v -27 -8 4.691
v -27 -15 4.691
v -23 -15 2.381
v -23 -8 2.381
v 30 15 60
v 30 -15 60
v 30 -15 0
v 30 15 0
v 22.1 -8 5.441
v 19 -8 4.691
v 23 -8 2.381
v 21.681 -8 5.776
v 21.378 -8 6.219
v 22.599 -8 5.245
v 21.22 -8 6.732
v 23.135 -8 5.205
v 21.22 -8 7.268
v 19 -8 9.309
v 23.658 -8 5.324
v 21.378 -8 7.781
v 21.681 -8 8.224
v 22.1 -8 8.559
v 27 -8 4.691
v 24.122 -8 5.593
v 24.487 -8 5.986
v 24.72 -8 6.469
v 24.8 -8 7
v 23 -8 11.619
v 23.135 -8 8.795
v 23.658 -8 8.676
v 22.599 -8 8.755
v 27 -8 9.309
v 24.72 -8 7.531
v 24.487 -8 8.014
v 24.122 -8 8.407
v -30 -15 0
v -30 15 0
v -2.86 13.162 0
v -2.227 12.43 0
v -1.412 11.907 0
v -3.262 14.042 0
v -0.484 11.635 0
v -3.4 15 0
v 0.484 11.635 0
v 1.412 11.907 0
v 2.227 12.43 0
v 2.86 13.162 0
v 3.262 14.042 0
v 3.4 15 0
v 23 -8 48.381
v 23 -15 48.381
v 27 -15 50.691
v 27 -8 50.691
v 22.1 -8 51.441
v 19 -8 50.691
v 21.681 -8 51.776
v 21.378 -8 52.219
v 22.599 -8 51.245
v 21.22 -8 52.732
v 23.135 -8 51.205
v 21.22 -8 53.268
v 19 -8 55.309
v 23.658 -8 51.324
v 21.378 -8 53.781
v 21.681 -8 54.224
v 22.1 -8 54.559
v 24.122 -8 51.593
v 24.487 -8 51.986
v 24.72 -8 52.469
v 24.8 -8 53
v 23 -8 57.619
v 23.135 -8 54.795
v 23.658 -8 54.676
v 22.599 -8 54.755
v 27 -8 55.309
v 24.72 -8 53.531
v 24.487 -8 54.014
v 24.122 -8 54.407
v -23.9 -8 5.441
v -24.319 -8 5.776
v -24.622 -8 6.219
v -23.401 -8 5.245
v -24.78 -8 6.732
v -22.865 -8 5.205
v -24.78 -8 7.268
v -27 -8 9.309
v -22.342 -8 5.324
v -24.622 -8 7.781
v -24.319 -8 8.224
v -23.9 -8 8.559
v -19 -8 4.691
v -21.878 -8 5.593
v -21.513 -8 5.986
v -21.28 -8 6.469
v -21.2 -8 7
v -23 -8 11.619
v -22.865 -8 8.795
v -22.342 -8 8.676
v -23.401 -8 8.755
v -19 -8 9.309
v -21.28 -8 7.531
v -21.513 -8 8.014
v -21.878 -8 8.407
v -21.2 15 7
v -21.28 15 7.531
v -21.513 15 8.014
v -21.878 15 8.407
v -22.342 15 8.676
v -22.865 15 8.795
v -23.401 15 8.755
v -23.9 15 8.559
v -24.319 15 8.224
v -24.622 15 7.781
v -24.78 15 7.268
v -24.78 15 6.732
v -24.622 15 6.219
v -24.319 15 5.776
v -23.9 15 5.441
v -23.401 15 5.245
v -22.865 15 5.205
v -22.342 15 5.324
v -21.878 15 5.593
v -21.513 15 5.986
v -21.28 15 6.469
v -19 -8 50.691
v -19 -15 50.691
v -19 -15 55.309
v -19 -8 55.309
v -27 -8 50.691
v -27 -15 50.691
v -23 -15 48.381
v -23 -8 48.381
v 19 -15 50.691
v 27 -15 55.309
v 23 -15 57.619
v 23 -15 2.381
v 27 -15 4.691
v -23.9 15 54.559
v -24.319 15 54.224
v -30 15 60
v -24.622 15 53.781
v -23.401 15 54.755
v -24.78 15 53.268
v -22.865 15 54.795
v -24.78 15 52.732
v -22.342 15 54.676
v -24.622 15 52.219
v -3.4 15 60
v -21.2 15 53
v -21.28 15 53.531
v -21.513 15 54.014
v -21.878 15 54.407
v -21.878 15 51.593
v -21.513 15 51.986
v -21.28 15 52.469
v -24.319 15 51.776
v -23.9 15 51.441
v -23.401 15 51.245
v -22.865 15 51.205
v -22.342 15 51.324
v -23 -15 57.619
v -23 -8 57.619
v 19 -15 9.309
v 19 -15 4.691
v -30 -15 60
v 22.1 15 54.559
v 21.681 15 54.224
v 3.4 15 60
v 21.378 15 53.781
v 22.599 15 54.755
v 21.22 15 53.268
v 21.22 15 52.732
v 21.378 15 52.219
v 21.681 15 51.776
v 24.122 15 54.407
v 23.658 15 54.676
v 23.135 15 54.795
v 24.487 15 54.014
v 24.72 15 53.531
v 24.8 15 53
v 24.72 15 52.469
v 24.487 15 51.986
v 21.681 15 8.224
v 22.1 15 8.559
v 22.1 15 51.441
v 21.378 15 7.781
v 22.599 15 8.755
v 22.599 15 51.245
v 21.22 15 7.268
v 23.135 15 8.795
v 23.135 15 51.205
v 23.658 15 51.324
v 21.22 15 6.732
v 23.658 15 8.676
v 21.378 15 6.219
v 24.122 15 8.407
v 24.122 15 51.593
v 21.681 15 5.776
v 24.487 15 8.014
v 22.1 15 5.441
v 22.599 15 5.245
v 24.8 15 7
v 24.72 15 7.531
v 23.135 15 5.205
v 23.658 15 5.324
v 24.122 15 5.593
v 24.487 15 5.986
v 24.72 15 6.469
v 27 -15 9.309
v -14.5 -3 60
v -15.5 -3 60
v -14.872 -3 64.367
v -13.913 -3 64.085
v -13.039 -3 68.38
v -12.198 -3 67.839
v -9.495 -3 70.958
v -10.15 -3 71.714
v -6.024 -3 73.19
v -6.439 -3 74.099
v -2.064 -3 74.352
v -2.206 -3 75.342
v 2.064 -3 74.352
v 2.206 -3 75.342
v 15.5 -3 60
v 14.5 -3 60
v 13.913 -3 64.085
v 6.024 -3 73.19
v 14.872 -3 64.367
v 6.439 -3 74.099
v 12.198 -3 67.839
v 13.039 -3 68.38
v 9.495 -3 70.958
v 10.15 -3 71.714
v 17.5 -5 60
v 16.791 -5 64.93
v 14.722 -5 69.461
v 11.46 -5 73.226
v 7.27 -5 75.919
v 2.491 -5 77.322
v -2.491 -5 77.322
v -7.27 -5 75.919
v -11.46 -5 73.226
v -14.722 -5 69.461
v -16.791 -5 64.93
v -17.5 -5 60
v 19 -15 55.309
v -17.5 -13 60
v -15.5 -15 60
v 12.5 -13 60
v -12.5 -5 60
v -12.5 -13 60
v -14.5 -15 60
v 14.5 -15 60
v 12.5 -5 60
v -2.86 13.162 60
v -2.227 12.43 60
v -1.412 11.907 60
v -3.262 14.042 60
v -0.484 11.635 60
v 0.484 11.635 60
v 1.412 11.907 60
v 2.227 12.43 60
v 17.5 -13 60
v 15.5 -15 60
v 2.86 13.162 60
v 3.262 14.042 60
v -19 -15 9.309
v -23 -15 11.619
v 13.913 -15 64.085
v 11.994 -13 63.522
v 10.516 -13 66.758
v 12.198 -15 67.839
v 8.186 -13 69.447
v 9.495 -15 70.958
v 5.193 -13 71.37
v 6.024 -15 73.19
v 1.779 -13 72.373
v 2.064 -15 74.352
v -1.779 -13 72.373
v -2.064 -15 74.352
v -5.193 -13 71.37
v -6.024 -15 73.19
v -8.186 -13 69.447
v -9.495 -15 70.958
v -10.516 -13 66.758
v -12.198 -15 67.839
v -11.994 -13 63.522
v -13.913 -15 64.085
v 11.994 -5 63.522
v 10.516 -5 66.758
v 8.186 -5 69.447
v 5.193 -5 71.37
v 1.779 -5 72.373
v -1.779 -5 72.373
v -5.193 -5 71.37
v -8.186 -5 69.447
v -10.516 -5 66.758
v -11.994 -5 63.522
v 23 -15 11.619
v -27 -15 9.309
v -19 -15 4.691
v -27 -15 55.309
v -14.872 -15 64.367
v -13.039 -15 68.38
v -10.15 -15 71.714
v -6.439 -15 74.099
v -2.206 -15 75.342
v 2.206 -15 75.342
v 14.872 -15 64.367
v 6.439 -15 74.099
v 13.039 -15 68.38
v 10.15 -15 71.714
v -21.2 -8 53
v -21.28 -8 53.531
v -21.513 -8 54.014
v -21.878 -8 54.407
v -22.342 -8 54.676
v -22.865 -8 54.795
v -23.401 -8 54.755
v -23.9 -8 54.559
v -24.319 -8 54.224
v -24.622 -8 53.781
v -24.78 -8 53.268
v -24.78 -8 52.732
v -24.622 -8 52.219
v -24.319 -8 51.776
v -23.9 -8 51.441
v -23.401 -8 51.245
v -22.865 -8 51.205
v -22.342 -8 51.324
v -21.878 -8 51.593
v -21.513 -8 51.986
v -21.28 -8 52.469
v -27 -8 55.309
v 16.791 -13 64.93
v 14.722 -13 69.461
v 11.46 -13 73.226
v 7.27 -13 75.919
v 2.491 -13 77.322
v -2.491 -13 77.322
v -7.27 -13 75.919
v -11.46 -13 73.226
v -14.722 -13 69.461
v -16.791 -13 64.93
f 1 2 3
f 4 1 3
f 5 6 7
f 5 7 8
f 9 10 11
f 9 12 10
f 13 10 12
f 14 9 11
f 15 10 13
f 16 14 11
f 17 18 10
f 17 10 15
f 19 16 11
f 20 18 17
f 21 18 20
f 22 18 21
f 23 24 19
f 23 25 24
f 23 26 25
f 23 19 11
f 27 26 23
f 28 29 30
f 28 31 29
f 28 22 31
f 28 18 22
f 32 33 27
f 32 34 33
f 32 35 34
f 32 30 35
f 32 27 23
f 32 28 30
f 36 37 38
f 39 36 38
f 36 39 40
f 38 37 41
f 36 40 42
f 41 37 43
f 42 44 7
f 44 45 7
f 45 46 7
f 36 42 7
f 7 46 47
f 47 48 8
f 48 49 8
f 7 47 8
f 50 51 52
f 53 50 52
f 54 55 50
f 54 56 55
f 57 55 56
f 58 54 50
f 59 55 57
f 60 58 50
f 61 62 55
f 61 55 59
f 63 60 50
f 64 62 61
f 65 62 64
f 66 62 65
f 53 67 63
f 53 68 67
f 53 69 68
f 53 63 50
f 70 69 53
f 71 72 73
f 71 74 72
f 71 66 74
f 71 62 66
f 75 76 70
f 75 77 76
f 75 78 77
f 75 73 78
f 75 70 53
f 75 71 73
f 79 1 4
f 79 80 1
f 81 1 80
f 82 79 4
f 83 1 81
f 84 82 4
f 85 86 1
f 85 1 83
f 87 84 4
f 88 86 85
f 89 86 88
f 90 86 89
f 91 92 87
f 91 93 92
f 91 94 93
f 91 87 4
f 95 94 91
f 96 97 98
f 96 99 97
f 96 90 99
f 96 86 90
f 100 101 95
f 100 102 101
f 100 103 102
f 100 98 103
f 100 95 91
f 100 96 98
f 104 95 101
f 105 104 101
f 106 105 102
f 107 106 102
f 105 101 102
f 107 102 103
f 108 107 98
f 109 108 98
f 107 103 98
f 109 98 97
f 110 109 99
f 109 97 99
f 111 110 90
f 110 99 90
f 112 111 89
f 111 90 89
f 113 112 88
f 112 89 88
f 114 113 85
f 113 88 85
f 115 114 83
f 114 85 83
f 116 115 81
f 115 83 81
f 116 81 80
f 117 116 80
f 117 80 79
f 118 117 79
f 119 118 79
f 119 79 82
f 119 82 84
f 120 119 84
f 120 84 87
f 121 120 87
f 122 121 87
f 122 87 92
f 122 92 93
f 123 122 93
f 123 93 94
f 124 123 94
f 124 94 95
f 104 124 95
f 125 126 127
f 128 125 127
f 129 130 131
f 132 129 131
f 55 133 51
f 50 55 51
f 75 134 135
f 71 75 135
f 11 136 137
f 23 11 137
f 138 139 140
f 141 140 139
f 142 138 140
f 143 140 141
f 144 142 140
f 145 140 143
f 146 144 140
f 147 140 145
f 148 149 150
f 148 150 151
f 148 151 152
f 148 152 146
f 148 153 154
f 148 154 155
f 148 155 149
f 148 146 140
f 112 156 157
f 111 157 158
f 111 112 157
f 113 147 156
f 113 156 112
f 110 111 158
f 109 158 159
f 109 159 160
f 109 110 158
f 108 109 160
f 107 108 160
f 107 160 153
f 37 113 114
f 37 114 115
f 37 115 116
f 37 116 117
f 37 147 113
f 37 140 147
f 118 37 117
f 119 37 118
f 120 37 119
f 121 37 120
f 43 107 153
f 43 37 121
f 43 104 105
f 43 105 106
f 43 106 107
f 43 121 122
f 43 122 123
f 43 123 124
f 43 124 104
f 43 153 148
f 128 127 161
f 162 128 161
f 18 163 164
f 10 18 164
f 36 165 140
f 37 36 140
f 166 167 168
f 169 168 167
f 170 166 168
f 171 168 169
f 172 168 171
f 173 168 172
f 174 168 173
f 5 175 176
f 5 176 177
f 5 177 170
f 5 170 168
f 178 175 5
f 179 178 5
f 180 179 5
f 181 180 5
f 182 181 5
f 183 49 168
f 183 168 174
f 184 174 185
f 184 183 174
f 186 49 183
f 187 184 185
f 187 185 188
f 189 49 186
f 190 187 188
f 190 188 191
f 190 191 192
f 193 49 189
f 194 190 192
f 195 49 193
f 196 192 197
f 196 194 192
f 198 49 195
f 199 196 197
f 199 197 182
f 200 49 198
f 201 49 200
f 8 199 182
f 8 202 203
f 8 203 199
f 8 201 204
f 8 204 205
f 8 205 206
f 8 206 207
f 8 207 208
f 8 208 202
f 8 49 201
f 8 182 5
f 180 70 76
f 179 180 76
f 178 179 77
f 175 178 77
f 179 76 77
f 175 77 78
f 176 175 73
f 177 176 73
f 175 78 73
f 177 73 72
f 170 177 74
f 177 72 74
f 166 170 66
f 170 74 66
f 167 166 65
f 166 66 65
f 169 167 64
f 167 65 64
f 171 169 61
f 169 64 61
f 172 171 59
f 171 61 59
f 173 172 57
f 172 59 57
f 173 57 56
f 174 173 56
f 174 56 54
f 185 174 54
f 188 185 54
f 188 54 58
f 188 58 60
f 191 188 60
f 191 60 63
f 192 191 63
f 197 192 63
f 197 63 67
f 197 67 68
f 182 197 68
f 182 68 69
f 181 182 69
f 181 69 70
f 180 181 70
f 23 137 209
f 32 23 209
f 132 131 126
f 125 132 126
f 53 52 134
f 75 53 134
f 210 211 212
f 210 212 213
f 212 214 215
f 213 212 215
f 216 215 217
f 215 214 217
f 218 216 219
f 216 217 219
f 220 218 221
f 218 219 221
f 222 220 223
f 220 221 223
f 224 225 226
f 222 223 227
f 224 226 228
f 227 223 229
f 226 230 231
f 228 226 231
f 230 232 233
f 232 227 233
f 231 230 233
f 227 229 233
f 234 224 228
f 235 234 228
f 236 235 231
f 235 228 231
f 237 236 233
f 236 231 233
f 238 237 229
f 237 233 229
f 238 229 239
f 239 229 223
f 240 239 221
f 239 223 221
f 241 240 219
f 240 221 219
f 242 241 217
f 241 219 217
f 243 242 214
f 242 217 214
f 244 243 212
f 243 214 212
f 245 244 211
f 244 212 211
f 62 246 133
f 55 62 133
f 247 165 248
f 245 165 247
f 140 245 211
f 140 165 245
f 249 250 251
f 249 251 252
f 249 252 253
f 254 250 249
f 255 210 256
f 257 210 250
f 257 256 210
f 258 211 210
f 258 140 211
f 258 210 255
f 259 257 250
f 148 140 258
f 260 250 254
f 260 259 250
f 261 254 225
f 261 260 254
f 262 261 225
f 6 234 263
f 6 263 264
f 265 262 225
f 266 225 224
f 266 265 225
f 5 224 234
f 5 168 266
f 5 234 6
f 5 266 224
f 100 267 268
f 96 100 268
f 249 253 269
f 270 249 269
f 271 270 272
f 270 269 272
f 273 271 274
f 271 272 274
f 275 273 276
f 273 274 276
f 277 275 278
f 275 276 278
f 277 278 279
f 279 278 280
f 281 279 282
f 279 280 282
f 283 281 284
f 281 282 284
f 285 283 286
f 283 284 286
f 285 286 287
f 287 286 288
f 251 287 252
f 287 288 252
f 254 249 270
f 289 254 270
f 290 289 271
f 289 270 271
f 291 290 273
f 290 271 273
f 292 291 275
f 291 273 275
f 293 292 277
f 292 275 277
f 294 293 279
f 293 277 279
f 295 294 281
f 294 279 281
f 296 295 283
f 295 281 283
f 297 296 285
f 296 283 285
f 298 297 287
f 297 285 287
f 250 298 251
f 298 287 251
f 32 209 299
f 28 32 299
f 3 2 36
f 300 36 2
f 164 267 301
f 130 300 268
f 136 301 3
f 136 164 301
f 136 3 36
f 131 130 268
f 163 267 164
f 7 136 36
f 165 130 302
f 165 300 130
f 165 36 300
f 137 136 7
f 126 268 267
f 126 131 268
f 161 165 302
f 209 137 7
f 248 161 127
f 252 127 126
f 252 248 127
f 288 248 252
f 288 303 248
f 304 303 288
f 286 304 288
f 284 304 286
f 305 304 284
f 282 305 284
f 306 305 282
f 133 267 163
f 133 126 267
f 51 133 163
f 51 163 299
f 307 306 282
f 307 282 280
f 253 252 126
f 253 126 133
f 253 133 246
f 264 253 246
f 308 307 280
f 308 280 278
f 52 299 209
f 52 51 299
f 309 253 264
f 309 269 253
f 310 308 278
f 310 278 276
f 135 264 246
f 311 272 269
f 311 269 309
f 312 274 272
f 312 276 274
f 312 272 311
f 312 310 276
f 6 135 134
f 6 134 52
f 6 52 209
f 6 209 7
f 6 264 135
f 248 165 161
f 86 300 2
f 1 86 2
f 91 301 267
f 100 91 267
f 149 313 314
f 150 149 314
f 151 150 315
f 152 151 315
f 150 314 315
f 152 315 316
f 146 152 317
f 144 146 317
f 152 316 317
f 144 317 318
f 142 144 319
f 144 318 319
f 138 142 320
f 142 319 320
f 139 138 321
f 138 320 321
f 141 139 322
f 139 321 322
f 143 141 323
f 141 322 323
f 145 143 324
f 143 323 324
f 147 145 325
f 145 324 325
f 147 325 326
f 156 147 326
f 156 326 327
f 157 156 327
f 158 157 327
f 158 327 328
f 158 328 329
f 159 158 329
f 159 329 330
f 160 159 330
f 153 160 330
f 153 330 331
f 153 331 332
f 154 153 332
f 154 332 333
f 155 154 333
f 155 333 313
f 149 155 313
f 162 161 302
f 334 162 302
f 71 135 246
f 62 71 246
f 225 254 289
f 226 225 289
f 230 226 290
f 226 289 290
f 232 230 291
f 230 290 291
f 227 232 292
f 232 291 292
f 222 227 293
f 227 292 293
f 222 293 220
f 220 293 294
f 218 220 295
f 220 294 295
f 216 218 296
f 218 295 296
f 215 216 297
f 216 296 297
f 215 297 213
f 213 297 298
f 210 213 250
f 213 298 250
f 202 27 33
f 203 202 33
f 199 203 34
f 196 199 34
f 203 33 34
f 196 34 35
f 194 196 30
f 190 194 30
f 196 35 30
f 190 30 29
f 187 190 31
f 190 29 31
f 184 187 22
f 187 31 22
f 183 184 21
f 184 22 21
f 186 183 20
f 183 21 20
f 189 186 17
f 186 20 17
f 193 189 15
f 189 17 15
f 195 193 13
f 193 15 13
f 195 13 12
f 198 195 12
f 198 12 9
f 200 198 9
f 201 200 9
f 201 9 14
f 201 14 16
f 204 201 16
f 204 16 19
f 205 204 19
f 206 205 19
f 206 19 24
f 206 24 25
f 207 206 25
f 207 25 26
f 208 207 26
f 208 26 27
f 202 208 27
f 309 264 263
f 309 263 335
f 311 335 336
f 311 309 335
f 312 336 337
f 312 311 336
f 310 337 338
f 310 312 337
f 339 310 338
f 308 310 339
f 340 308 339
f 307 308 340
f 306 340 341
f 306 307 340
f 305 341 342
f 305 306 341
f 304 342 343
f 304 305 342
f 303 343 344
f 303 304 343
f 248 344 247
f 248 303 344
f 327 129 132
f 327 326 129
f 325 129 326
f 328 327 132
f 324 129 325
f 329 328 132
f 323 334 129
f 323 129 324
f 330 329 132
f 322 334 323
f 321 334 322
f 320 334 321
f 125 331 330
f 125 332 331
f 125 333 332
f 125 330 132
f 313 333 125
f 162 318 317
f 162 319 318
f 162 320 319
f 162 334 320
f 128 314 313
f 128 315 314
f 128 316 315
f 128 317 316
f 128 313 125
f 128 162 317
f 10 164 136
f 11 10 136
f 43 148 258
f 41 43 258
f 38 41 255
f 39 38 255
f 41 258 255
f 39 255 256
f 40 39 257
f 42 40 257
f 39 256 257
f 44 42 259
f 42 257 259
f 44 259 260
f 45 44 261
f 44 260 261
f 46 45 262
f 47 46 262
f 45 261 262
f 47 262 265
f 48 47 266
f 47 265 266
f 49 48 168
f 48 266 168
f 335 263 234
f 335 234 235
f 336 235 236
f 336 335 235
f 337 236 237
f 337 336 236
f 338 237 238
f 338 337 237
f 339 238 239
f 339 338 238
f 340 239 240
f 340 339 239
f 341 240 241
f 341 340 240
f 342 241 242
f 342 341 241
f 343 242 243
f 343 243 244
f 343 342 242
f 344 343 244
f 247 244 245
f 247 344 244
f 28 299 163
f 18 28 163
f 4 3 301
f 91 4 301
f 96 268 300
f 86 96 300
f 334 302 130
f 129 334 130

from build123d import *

# Parameters (mm, degrees)
F0_W      = 60
F0_H      = 30
F1_DEPTH  = 60
F2_R      = 3.4
F3_DEPTH  = 60.001
F4_R      = 1.8
F5_DEPTH  = 30.001
F7_DEPTH  = 7
F9_DEPTH  = 7
F11_DEPTH = 7
F13_DEPTH = 7
F14_R     = 17.5
F15_DEPTH = 12
F17_DEPTH = 30.001
F18_SIZE  = 2


with BuildPart() as f1:
    # F0 (on Top) → F1 (new body)
    with BuildSketch(Plane.XY):
        Rectangle(F0_W, F0_H)
    extrude(amount=F1_DEPTH)

    # F2 (on face) → F3 (cut, through all)
    with BuildSketch(Plane.XY.offset(60)):
        with Locations((0, 15)):
            Circle(F2_R)
    extrude(amount=-F3_DEPTH, mode=Mode.SUBTRACT)

    # F4 (on face) → F5 (cut, through all)
    with BuildSketch(Plane.XZ.offset(15)):
        with Locations((-23, 53)):
            Circle(F4_R)
        with Locations((23, 53)):
            Circle(F4_R)
        with Locations((23, 7)):
            Circle(F4_R)
        with Locations((-23, 7)):
            Circle(F4_R)
    extrude(amount=-F5_DEPTH, mode=Mode.SUBTRACT)

    # F6 (on face) → F7 (cut)
    with BuildSketch(Plane.XZ.offset(15)):
        Polygon((-23, 48.3811978465), (-19, 50.6905989232), (-19, 55.3094010768), (-23, 57.6188021535), (-27, 55.3094010768), (-27, 50.6905989232), align=None)
    extrude(amount=-F7_DEPTH, mode=Mode.SUBTRACT)

    # F8 (on face) → F9 (cut)
    with BuildSketch(Plane.XZ.offset(15)):
        Polygon((19, 50.6905989232), (23, 48.3811978465), (27, 50.6905989232), (27, 55.3094010768), (23, 57.6188021535), (19, 55.3094010768), align=None)
    extrude(amount=-F9_DEPTH, mode=Mode.SUBTRACT)

    # F10 (on face) → F11 (cut)
    with BuildSketch(Plane.XZ.offset(15)):
        Polygon((-23, 2.3811978465), (-19, 4.6905989232), (-19, 9.3094010768), (-23, 11.6188021535), (-27, 9.3094010768), (-27, 4.6905989232), align=None)
    extrude(amount=-F11_DEPTH, mode=Mode.SUBTRACT)

    # F12 (on face) → F13 (cut)
    with BuildSketch(Plane.XZ.offset(15)):
        Polygon((23, 2.3811978465), (27, 4.6905989232), (27, 9.3094010768), (23, 11.6188021535), (19, 9.3094010768), (19, 4.6905989232), align=None)
    extrude(amount=-F13_DEPTH, mode=Mode.SUBTRACT)

    # F14 (on face) → F15 (join)
    with BuildSketch(Plane.XZ.offset(15)):
        with Locations((0, 60)):
            Circle(F14_R)
    extrude(amount=-F15_DEPTH)

    # F16 (on face) → F17 (cut, through all)
    with BuildSketch(Plane.XZ.offset(15)):
        with BuildLine():
            Line((-12.5, 60), (12.5, 60))
            ThreePointArc((12.5, 60), (0, 72.5), (-12.5, 60))
        make_face()
    extrude(amount=-F17_DEPTH, mode=Mode.SUBTRACT)

    # F18
    f18_edges = [f1.edges().sort_by_distance(p)[0] for p in [
        (0, -15, 77.5),
        (0, -3, 77.5),
        (0, -15, 72.5),
        (0, -3, 72.5),
    ]]
    chamfer(f18_edges, length=F18_SIZE)


solid = f1.part
